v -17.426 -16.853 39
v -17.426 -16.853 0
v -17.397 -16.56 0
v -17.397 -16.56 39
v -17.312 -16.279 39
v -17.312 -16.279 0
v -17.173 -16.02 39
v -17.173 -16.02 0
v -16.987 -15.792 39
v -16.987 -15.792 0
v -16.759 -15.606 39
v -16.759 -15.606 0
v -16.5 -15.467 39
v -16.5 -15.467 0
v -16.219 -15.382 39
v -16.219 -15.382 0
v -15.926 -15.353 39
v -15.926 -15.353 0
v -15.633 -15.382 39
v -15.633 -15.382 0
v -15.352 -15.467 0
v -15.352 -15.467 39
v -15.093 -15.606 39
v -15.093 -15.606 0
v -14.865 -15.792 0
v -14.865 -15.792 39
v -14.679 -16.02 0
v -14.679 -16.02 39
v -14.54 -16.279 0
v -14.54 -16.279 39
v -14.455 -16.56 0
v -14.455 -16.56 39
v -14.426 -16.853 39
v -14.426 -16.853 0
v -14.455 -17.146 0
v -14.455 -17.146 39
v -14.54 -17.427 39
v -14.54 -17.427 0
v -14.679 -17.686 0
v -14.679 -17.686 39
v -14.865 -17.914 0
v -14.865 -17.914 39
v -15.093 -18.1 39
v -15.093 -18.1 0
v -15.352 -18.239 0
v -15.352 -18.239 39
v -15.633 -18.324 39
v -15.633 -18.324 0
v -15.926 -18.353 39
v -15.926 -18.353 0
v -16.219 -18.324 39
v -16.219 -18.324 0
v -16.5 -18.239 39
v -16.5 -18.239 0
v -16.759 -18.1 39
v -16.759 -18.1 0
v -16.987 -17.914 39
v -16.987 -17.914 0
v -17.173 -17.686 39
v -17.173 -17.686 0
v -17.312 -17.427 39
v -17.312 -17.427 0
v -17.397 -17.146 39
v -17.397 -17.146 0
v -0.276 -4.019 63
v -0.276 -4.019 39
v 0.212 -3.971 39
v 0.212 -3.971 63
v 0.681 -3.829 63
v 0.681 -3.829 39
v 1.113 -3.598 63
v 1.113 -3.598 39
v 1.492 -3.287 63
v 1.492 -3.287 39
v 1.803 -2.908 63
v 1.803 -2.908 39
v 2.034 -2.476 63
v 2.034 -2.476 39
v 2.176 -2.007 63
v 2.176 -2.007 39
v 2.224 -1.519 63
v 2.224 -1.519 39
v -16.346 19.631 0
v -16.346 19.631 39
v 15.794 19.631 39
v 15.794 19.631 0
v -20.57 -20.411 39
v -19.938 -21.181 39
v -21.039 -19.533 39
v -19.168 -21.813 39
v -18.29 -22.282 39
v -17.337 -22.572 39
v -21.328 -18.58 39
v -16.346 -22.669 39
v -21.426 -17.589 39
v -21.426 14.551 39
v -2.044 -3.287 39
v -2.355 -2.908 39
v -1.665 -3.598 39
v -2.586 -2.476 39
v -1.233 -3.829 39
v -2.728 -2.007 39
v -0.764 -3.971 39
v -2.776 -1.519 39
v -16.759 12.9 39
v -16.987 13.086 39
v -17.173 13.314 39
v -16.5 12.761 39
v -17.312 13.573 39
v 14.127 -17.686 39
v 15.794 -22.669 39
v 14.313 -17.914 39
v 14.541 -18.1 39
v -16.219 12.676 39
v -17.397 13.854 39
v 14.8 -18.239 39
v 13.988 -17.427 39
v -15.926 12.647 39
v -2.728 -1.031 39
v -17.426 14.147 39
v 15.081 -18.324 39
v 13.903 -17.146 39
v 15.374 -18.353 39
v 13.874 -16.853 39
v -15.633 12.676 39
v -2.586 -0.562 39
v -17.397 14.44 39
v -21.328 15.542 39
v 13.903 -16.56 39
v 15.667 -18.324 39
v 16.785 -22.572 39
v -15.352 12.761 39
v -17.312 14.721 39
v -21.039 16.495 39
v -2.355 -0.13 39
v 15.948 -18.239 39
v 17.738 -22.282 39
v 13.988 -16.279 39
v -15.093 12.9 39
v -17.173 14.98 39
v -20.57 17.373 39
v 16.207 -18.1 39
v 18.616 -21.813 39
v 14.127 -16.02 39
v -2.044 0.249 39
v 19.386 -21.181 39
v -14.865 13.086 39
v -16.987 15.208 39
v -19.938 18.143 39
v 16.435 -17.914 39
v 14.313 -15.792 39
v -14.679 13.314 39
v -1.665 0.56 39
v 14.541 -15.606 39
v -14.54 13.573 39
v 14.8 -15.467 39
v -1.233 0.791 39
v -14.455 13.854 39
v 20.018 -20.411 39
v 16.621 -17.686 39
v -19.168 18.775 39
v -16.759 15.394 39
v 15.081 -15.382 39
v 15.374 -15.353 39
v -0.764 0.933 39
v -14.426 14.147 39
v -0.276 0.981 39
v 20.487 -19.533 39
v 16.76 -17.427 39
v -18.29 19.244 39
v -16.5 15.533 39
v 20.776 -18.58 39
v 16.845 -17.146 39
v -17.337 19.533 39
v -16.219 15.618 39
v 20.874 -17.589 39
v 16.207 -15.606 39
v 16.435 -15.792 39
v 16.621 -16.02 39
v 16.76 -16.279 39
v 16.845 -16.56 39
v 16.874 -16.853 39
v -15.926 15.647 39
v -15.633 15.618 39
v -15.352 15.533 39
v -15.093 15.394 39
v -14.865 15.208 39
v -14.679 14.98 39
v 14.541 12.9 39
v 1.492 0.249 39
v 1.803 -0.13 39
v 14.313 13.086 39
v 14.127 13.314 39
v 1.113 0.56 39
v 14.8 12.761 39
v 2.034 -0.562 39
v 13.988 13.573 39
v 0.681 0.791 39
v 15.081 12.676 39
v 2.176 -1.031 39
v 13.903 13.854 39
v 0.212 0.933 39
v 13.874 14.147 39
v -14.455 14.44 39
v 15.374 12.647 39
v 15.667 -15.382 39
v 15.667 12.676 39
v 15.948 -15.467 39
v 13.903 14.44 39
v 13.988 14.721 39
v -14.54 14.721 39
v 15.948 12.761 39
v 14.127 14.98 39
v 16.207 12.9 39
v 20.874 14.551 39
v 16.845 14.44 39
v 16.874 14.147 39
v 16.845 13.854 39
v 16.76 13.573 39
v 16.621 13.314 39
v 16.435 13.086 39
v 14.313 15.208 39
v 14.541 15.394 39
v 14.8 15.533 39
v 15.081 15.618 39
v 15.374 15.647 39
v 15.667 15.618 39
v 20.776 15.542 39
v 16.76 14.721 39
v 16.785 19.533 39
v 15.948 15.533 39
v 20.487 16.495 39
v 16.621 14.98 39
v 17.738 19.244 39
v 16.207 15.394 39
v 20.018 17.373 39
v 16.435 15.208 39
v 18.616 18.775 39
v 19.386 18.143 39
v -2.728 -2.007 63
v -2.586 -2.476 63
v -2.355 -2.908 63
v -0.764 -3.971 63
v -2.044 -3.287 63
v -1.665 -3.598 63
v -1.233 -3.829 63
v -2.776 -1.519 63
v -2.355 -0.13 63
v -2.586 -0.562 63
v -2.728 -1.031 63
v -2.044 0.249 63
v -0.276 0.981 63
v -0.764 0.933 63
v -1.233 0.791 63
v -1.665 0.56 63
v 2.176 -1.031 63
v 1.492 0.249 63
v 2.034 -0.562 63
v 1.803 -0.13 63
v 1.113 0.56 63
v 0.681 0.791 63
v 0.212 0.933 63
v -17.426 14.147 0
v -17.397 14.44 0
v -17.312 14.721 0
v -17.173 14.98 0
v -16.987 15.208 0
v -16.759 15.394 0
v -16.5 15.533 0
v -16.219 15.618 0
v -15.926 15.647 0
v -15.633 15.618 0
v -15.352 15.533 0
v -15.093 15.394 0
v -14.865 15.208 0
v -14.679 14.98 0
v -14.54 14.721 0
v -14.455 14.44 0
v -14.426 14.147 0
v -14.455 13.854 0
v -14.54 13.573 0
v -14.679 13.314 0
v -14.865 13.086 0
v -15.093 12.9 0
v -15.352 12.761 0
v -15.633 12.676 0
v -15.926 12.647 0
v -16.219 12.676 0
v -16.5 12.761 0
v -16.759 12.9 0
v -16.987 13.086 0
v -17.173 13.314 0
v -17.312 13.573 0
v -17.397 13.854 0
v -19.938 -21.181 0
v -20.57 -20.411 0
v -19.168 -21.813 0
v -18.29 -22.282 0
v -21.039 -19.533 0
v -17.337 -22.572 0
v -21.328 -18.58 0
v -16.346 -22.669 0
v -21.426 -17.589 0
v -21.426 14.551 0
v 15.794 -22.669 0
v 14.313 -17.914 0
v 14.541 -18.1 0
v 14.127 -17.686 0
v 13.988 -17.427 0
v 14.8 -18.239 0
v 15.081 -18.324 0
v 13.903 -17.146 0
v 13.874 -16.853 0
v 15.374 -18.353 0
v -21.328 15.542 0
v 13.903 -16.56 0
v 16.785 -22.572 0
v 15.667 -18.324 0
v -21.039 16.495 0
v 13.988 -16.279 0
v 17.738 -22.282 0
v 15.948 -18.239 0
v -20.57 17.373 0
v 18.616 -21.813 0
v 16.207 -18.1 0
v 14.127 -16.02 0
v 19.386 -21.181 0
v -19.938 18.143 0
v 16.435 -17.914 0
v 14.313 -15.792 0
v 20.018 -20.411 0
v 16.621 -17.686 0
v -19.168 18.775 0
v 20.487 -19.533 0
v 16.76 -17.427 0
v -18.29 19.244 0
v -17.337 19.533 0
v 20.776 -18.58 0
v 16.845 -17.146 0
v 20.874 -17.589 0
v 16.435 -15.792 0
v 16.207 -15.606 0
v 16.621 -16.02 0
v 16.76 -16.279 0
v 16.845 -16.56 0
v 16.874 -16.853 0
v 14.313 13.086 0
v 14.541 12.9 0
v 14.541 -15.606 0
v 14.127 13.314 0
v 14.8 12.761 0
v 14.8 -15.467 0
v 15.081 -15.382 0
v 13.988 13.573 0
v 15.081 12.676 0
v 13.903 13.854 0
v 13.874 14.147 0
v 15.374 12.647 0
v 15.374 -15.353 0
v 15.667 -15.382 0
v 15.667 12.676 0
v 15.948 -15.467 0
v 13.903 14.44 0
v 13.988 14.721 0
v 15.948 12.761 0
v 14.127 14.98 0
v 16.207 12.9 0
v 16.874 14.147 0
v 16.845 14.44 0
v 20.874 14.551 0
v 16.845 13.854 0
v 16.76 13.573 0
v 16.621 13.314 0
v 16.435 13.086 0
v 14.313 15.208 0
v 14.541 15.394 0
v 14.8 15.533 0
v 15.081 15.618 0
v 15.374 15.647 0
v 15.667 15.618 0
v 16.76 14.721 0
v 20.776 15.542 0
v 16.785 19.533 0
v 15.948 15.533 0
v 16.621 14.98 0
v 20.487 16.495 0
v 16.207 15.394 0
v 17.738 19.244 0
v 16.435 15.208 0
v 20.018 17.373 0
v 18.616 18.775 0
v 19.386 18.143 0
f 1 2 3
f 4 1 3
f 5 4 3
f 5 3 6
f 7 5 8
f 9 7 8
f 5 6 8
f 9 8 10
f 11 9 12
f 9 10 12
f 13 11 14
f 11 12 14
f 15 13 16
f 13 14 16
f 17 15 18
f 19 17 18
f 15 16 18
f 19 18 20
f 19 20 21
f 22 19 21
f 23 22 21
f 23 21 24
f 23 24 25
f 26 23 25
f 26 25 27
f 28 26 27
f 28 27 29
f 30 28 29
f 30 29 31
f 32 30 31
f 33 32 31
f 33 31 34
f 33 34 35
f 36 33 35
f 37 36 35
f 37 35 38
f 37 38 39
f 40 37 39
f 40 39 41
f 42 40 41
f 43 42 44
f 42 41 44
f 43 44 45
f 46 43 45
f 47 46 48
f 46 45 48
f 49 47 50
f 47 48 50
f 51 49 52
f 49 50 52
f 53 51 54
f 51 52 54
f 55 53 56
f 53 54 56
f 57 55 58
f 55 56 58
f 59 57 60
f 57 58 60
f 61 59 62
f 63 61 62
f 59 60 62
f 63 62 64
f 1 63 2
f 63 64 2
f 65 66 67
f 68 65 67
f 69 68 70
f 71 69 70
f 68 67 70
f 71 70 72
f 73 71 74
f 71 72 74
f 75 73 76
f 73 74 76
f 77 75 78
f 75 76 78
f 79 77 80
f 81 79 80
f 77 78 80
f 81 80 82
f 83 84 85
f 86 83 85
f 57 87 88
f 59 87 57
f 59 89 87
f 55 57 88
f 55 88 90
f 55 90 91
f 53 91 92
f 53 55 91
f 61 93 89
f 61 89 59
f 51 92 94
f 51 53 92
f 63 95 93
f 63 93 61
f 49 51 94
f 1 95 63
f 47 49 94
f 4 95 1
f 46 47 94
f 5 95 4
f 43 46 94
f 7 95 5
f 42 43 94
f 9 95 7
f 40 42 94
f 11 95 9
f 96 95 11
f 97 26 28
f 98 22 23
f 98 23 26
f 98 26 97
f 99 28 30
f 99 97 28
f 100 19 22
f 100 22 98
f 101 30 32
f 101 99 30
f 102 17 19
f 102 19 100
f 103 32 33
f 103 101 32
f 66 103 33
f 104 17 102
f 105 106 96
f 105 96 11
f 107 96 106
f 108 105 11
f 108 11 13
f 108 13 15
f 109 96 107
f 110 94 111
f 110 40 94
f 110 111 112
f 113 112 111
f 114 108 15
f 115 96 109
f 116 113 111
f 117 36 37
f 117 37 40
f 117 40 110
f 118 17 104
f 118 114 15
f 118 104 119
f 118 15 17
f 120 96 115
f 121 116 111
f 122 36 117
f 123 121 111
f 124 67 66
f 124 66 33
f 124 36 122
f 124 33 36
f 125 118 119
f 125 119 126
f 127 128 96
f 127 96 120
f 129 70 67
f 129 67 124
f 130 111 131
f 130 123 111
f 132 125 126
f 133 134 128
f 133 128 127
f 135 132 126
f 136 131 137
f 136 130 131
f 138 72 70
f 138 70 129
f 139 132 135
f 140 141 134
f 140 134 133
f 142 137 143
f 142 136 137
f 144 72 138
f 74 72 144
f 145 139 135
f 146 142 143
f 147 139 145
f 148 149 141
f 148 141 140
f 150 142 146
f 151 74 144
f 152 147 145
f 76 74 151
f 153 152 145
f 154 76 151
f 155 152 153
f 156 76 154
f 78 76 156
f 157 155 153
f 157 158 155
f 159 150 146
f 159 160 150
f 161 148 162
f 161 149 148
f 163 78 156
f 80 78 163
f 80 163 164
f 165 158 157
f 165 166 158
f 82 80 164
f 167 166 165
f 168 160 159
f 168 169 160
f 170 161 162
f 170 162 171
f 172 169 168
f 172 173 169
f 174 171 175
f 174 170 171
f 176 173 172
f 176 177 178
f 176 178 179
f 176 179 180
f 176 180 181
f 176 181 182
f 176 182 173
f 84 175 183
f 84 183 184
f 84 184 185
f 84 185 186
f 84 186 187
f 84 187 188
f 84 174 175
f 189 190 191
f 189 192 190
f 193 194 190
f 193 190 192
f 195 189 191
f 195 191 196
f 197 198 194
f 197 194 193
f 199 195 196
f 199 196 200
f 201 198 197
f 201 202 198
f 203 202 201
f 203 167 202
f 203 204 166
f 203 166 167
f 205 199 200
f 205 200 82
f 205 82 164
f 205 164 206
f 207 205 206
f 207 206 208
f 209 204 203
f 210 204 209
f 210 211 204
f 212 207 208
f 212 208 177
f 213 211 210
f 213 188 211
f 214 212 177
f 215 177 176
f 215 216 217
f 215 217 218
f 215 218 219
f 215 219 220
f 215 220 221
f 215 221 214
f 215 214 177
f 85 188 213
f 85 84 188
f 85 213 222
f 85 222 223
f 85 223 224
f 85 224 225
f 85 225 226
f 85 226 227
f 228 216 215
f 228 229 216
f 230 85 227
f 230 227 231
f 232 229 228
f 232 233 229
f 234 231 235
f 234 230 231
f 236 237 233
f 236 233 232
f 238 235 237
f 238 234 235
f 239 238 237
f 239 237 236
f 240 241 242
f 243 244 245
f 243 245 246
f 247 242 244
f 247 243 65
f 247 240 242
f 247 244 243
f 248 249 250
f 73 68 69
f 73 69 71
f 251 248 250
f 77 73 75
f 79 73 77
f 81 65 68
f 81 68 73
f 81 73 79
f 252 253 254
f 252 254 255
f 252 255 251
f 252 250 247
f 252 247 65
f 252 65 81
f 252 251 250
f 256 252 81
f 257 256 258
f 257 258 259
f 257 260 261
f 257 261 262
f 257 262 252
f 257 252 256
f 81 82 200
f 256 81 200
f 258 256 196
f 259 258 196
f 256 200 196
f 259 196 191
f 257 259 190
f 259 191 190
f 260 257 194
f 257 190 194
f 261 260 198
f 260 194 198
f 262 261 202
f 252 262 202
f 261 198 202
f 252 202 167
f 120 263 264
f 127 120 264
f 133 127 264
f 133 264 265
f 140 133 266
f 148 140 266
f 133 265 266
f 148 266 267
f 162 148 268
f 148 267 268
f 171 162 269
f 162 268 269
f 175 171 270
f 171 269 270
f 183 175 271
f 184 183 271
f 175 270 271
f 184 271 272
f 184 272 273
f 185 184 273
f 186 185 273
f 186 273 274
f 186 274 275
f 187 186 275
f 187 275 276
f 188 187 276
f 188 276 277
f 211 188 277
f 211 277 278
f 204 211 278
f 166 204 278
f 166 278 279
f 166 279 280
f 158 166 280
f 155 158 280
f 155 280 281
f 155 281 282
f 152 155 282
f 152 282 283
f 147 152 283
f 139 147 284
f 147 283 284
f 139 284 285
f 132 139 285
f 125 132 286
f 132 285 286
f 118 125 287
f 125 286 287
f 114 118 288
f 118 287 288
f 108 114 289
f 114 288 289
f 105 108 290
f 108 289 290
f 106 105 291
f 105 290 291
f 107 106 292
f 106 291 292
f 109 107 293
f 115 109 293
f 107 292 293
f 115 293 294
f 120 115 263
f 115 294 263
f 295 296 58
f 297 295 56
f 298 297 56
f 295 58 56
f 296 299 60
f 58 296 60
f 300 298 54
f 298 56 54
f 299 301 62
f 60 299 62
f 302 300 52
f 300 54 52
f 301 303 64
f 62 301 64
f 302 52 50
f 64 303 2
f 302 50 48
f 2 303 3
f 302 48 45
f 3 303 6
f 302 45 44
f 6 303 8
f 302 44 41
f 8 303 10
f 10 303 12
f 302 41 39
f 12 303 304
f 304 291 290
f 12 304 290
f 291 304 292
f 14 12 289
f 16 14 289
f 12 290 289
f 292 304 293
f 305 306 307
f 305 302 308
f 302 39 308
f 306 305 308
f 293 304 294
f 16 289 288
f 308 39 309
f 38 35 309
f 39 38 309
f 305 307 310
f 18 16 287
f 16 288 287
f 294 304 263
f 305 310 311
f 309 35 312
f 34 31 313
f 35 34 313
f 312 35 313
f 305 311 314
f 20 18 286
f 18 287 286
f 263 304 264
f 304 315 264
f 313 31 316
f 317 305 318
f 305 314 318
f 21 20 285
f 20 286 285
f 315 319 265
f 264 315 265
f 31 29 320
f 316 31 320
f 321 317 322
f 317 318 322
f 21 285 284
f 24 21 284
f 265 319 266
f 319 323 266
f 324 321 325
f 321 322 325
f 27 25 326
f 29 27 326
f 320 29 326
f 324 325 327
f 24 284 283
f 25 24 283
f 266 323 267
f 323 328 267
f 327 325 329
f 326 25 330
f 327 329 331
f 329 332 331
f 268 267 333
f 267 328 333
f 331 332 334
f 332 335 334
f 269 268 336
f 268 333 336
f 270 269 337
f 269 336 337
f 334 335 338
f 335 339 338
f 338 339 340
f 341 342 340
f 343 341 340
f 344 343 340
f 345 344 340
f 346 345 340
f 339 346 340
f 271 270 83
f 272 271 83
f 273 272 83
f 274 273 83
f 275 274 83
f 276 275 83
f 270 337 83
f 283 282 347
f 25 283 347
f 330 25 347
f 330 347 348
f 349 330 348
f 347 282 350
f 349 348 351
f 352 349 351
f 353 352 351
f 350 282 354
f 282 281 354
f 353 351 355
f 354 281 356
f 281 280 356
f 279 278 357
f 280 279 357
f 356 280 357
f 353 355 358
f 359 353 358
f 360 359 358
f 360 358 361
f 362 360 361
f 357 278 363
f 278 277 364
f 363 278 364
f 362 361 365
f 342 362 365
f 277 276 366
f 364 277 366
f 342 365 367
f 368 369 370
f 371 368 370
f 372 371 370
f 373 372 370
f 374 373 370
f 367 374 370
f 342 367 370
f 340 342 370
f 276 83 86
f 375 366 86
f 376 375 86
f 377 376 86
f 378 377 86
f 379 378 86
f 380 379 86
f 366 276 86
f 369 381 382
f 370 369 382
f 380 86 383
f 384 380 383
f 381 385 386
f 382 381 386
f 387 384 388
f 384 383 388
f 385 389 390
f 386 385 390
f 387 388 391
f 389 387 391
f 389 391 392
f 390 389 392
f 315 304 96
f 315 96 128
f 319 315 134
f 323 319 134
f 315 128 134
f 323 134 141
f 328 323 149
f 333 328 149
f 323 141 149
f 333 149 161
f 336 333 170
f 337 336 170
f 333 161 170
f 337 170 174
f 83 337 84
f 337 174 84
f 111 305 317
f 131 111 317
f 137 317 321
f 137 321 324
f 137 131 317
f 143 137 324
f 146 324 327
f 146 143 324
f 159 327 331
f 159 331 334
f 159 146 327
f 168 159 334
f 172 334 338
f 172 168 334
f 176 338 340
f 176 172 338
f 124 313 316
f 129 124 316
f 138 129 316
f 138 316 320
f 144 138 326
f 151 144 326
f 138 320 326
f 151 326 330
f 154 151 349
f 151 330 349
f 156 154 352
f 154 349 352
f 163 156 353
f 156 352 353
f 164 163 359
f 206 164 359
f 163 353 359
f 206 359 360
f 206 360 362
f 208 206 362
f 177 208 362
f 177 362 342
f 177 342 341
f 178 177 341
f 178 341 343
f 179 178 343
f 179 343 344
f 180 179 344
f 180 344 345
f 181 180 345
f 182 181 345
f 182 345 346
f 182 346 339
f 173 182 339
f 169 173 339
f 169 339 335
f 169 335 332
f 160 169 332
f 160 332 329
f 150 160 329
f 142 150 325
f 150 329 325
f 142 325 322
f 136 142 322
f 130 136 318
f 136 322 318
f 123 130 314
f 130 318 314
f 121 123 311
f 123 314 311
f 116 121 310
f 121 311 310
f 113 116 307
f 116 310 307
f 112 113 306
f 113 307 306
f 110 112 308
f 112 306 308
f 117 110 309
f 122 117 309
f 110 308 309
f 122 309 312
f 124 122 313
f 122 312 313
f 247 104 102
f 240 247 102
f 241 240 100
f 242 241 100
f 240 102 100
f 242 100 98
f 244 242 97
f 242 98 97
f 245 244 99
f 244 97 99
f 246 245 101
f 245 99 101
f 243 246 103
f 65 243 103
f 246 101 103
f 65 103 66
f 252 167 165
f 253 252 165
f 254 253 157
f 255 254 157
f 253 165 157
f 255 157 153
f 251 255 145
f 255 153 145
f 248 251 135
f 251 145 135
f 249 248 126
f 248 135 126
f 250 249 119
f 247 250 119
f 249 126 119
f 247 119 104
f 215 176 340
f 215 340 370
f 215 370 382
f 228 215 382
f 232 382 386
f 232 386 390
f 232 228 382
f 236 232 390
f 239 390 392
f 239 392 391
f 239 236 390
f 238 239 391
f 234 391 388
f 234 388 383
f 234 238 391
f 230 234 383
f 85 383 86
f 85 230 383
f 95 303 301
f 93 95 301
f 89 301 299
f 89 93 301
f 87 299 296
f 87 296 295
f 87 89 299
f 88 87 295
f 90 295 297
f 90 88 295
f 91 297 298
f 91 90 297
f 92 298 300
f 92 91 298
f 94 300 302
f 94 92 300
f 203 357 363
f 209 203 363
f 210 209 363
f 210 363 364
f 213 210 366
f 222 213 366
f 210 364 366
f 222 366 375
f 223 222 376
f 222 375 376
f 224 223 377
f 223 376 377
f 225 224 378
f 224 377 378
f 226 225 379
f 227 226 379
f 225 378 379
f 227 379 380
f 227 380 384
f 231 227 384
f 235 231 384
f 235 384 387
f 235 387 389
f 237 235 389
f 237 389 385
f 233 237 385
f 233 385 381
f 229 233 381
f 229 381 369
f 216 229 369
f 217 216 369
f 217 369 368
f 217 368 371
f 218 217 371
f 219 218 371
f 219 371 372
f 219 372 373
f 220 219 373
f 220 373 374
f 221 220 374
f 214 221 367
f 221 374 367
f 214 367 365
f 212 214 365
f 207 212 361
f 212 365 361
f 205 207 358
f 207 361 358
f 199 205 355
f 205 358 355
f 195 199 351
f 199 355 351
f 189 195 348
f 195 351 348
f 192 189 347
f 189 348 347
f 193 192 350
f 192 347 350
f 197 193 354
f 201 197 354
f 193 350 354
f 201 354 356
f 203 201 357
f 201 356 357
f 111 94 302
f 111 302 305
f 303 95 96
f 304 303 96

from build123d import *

# Parameters (mm, degrees)
F0_W     = 42.3
F0_H     = 42.3
F1_DEPTH = 39
F2_R     = 5.08
F4_D     = 3
F6_DEPTH = 24


with BuildPart() as f1:
    # F0 (on Top) → F1 (new body)
    with BuildSketch(Plane.XY):
        with Locations((-0.275903, -1.519124)):
            Rectangle(F0_W, F0_H)
    extrude(amount=F1_DEPTH)

    # F2
    f2_edges = [f1.edges().sort_by_distance(p)[0] for p in [
        (20.874097, 19.630876, 19.5),
        (20.874097, -22.669124, 19.5),
        (-21.425903, 19.630876, 19.5),
        (-21.425903, -22.669124, 19.5),
    ]]
    fillet(f2_edges, radius=F2_R)

    # F4 (through all)
    with Locations(Plane.XY.offset(39)):
        with Locations((15.374097, 14.146936), (15.374097, -16.853064), (-15.925903, -16.853064), (-15.925903, 14.146936)):
            Hole(F4_D / 2)

    # F5 (on face) → F6 (join)
    with BuildSketch(Plane.XY.offset(39)):
        with BuildLine():
            ThreePointArc((-0.275903, -4.019124), (1.491864, -3.286891), (2.224097, -1.519124))
            Line((2.224097, -1.519124), (-0.275903, -1.519124))
            Line((-0.275903, -1.519124), (-0.275903, -4.019124))
        make_face()
        with BuildLine():
            Line((-0.275903, -1.519124), (2.224097, -1.519124))
            ThreePointArc((2.224097, -1.519124), (1.491864, 0.248643), (-0.275903, 0.980876))
            Line((-0.275903, 0.980876), (-0.275903, -1.519124))
        make_face()
        with BuildLine():
            Line((-0.275903, -4.019124), (-0.275903, -1.519124))
            Line((-0.275903, -1.519124), (-2.775903, -1.519124))
            ThreePointArc((-2.775903, -1.519124), (-2.04367, -3.286891), (-0.275903, -4.019124))
        make_face()
        with BuildLine():
            Line((-2.775903, -1.519124), (-0.275903, -1.519124))
            Line((-0.275903, -1.519124), (-0.275903, 0.980876))
            ThreePointArc((-0.275903, 0.980876), (-2.04367, 0.248643), (-2.775903, -1.519124))
        make_face()
    extrude(amount=F6_DEPTH)


solid = f1.part
